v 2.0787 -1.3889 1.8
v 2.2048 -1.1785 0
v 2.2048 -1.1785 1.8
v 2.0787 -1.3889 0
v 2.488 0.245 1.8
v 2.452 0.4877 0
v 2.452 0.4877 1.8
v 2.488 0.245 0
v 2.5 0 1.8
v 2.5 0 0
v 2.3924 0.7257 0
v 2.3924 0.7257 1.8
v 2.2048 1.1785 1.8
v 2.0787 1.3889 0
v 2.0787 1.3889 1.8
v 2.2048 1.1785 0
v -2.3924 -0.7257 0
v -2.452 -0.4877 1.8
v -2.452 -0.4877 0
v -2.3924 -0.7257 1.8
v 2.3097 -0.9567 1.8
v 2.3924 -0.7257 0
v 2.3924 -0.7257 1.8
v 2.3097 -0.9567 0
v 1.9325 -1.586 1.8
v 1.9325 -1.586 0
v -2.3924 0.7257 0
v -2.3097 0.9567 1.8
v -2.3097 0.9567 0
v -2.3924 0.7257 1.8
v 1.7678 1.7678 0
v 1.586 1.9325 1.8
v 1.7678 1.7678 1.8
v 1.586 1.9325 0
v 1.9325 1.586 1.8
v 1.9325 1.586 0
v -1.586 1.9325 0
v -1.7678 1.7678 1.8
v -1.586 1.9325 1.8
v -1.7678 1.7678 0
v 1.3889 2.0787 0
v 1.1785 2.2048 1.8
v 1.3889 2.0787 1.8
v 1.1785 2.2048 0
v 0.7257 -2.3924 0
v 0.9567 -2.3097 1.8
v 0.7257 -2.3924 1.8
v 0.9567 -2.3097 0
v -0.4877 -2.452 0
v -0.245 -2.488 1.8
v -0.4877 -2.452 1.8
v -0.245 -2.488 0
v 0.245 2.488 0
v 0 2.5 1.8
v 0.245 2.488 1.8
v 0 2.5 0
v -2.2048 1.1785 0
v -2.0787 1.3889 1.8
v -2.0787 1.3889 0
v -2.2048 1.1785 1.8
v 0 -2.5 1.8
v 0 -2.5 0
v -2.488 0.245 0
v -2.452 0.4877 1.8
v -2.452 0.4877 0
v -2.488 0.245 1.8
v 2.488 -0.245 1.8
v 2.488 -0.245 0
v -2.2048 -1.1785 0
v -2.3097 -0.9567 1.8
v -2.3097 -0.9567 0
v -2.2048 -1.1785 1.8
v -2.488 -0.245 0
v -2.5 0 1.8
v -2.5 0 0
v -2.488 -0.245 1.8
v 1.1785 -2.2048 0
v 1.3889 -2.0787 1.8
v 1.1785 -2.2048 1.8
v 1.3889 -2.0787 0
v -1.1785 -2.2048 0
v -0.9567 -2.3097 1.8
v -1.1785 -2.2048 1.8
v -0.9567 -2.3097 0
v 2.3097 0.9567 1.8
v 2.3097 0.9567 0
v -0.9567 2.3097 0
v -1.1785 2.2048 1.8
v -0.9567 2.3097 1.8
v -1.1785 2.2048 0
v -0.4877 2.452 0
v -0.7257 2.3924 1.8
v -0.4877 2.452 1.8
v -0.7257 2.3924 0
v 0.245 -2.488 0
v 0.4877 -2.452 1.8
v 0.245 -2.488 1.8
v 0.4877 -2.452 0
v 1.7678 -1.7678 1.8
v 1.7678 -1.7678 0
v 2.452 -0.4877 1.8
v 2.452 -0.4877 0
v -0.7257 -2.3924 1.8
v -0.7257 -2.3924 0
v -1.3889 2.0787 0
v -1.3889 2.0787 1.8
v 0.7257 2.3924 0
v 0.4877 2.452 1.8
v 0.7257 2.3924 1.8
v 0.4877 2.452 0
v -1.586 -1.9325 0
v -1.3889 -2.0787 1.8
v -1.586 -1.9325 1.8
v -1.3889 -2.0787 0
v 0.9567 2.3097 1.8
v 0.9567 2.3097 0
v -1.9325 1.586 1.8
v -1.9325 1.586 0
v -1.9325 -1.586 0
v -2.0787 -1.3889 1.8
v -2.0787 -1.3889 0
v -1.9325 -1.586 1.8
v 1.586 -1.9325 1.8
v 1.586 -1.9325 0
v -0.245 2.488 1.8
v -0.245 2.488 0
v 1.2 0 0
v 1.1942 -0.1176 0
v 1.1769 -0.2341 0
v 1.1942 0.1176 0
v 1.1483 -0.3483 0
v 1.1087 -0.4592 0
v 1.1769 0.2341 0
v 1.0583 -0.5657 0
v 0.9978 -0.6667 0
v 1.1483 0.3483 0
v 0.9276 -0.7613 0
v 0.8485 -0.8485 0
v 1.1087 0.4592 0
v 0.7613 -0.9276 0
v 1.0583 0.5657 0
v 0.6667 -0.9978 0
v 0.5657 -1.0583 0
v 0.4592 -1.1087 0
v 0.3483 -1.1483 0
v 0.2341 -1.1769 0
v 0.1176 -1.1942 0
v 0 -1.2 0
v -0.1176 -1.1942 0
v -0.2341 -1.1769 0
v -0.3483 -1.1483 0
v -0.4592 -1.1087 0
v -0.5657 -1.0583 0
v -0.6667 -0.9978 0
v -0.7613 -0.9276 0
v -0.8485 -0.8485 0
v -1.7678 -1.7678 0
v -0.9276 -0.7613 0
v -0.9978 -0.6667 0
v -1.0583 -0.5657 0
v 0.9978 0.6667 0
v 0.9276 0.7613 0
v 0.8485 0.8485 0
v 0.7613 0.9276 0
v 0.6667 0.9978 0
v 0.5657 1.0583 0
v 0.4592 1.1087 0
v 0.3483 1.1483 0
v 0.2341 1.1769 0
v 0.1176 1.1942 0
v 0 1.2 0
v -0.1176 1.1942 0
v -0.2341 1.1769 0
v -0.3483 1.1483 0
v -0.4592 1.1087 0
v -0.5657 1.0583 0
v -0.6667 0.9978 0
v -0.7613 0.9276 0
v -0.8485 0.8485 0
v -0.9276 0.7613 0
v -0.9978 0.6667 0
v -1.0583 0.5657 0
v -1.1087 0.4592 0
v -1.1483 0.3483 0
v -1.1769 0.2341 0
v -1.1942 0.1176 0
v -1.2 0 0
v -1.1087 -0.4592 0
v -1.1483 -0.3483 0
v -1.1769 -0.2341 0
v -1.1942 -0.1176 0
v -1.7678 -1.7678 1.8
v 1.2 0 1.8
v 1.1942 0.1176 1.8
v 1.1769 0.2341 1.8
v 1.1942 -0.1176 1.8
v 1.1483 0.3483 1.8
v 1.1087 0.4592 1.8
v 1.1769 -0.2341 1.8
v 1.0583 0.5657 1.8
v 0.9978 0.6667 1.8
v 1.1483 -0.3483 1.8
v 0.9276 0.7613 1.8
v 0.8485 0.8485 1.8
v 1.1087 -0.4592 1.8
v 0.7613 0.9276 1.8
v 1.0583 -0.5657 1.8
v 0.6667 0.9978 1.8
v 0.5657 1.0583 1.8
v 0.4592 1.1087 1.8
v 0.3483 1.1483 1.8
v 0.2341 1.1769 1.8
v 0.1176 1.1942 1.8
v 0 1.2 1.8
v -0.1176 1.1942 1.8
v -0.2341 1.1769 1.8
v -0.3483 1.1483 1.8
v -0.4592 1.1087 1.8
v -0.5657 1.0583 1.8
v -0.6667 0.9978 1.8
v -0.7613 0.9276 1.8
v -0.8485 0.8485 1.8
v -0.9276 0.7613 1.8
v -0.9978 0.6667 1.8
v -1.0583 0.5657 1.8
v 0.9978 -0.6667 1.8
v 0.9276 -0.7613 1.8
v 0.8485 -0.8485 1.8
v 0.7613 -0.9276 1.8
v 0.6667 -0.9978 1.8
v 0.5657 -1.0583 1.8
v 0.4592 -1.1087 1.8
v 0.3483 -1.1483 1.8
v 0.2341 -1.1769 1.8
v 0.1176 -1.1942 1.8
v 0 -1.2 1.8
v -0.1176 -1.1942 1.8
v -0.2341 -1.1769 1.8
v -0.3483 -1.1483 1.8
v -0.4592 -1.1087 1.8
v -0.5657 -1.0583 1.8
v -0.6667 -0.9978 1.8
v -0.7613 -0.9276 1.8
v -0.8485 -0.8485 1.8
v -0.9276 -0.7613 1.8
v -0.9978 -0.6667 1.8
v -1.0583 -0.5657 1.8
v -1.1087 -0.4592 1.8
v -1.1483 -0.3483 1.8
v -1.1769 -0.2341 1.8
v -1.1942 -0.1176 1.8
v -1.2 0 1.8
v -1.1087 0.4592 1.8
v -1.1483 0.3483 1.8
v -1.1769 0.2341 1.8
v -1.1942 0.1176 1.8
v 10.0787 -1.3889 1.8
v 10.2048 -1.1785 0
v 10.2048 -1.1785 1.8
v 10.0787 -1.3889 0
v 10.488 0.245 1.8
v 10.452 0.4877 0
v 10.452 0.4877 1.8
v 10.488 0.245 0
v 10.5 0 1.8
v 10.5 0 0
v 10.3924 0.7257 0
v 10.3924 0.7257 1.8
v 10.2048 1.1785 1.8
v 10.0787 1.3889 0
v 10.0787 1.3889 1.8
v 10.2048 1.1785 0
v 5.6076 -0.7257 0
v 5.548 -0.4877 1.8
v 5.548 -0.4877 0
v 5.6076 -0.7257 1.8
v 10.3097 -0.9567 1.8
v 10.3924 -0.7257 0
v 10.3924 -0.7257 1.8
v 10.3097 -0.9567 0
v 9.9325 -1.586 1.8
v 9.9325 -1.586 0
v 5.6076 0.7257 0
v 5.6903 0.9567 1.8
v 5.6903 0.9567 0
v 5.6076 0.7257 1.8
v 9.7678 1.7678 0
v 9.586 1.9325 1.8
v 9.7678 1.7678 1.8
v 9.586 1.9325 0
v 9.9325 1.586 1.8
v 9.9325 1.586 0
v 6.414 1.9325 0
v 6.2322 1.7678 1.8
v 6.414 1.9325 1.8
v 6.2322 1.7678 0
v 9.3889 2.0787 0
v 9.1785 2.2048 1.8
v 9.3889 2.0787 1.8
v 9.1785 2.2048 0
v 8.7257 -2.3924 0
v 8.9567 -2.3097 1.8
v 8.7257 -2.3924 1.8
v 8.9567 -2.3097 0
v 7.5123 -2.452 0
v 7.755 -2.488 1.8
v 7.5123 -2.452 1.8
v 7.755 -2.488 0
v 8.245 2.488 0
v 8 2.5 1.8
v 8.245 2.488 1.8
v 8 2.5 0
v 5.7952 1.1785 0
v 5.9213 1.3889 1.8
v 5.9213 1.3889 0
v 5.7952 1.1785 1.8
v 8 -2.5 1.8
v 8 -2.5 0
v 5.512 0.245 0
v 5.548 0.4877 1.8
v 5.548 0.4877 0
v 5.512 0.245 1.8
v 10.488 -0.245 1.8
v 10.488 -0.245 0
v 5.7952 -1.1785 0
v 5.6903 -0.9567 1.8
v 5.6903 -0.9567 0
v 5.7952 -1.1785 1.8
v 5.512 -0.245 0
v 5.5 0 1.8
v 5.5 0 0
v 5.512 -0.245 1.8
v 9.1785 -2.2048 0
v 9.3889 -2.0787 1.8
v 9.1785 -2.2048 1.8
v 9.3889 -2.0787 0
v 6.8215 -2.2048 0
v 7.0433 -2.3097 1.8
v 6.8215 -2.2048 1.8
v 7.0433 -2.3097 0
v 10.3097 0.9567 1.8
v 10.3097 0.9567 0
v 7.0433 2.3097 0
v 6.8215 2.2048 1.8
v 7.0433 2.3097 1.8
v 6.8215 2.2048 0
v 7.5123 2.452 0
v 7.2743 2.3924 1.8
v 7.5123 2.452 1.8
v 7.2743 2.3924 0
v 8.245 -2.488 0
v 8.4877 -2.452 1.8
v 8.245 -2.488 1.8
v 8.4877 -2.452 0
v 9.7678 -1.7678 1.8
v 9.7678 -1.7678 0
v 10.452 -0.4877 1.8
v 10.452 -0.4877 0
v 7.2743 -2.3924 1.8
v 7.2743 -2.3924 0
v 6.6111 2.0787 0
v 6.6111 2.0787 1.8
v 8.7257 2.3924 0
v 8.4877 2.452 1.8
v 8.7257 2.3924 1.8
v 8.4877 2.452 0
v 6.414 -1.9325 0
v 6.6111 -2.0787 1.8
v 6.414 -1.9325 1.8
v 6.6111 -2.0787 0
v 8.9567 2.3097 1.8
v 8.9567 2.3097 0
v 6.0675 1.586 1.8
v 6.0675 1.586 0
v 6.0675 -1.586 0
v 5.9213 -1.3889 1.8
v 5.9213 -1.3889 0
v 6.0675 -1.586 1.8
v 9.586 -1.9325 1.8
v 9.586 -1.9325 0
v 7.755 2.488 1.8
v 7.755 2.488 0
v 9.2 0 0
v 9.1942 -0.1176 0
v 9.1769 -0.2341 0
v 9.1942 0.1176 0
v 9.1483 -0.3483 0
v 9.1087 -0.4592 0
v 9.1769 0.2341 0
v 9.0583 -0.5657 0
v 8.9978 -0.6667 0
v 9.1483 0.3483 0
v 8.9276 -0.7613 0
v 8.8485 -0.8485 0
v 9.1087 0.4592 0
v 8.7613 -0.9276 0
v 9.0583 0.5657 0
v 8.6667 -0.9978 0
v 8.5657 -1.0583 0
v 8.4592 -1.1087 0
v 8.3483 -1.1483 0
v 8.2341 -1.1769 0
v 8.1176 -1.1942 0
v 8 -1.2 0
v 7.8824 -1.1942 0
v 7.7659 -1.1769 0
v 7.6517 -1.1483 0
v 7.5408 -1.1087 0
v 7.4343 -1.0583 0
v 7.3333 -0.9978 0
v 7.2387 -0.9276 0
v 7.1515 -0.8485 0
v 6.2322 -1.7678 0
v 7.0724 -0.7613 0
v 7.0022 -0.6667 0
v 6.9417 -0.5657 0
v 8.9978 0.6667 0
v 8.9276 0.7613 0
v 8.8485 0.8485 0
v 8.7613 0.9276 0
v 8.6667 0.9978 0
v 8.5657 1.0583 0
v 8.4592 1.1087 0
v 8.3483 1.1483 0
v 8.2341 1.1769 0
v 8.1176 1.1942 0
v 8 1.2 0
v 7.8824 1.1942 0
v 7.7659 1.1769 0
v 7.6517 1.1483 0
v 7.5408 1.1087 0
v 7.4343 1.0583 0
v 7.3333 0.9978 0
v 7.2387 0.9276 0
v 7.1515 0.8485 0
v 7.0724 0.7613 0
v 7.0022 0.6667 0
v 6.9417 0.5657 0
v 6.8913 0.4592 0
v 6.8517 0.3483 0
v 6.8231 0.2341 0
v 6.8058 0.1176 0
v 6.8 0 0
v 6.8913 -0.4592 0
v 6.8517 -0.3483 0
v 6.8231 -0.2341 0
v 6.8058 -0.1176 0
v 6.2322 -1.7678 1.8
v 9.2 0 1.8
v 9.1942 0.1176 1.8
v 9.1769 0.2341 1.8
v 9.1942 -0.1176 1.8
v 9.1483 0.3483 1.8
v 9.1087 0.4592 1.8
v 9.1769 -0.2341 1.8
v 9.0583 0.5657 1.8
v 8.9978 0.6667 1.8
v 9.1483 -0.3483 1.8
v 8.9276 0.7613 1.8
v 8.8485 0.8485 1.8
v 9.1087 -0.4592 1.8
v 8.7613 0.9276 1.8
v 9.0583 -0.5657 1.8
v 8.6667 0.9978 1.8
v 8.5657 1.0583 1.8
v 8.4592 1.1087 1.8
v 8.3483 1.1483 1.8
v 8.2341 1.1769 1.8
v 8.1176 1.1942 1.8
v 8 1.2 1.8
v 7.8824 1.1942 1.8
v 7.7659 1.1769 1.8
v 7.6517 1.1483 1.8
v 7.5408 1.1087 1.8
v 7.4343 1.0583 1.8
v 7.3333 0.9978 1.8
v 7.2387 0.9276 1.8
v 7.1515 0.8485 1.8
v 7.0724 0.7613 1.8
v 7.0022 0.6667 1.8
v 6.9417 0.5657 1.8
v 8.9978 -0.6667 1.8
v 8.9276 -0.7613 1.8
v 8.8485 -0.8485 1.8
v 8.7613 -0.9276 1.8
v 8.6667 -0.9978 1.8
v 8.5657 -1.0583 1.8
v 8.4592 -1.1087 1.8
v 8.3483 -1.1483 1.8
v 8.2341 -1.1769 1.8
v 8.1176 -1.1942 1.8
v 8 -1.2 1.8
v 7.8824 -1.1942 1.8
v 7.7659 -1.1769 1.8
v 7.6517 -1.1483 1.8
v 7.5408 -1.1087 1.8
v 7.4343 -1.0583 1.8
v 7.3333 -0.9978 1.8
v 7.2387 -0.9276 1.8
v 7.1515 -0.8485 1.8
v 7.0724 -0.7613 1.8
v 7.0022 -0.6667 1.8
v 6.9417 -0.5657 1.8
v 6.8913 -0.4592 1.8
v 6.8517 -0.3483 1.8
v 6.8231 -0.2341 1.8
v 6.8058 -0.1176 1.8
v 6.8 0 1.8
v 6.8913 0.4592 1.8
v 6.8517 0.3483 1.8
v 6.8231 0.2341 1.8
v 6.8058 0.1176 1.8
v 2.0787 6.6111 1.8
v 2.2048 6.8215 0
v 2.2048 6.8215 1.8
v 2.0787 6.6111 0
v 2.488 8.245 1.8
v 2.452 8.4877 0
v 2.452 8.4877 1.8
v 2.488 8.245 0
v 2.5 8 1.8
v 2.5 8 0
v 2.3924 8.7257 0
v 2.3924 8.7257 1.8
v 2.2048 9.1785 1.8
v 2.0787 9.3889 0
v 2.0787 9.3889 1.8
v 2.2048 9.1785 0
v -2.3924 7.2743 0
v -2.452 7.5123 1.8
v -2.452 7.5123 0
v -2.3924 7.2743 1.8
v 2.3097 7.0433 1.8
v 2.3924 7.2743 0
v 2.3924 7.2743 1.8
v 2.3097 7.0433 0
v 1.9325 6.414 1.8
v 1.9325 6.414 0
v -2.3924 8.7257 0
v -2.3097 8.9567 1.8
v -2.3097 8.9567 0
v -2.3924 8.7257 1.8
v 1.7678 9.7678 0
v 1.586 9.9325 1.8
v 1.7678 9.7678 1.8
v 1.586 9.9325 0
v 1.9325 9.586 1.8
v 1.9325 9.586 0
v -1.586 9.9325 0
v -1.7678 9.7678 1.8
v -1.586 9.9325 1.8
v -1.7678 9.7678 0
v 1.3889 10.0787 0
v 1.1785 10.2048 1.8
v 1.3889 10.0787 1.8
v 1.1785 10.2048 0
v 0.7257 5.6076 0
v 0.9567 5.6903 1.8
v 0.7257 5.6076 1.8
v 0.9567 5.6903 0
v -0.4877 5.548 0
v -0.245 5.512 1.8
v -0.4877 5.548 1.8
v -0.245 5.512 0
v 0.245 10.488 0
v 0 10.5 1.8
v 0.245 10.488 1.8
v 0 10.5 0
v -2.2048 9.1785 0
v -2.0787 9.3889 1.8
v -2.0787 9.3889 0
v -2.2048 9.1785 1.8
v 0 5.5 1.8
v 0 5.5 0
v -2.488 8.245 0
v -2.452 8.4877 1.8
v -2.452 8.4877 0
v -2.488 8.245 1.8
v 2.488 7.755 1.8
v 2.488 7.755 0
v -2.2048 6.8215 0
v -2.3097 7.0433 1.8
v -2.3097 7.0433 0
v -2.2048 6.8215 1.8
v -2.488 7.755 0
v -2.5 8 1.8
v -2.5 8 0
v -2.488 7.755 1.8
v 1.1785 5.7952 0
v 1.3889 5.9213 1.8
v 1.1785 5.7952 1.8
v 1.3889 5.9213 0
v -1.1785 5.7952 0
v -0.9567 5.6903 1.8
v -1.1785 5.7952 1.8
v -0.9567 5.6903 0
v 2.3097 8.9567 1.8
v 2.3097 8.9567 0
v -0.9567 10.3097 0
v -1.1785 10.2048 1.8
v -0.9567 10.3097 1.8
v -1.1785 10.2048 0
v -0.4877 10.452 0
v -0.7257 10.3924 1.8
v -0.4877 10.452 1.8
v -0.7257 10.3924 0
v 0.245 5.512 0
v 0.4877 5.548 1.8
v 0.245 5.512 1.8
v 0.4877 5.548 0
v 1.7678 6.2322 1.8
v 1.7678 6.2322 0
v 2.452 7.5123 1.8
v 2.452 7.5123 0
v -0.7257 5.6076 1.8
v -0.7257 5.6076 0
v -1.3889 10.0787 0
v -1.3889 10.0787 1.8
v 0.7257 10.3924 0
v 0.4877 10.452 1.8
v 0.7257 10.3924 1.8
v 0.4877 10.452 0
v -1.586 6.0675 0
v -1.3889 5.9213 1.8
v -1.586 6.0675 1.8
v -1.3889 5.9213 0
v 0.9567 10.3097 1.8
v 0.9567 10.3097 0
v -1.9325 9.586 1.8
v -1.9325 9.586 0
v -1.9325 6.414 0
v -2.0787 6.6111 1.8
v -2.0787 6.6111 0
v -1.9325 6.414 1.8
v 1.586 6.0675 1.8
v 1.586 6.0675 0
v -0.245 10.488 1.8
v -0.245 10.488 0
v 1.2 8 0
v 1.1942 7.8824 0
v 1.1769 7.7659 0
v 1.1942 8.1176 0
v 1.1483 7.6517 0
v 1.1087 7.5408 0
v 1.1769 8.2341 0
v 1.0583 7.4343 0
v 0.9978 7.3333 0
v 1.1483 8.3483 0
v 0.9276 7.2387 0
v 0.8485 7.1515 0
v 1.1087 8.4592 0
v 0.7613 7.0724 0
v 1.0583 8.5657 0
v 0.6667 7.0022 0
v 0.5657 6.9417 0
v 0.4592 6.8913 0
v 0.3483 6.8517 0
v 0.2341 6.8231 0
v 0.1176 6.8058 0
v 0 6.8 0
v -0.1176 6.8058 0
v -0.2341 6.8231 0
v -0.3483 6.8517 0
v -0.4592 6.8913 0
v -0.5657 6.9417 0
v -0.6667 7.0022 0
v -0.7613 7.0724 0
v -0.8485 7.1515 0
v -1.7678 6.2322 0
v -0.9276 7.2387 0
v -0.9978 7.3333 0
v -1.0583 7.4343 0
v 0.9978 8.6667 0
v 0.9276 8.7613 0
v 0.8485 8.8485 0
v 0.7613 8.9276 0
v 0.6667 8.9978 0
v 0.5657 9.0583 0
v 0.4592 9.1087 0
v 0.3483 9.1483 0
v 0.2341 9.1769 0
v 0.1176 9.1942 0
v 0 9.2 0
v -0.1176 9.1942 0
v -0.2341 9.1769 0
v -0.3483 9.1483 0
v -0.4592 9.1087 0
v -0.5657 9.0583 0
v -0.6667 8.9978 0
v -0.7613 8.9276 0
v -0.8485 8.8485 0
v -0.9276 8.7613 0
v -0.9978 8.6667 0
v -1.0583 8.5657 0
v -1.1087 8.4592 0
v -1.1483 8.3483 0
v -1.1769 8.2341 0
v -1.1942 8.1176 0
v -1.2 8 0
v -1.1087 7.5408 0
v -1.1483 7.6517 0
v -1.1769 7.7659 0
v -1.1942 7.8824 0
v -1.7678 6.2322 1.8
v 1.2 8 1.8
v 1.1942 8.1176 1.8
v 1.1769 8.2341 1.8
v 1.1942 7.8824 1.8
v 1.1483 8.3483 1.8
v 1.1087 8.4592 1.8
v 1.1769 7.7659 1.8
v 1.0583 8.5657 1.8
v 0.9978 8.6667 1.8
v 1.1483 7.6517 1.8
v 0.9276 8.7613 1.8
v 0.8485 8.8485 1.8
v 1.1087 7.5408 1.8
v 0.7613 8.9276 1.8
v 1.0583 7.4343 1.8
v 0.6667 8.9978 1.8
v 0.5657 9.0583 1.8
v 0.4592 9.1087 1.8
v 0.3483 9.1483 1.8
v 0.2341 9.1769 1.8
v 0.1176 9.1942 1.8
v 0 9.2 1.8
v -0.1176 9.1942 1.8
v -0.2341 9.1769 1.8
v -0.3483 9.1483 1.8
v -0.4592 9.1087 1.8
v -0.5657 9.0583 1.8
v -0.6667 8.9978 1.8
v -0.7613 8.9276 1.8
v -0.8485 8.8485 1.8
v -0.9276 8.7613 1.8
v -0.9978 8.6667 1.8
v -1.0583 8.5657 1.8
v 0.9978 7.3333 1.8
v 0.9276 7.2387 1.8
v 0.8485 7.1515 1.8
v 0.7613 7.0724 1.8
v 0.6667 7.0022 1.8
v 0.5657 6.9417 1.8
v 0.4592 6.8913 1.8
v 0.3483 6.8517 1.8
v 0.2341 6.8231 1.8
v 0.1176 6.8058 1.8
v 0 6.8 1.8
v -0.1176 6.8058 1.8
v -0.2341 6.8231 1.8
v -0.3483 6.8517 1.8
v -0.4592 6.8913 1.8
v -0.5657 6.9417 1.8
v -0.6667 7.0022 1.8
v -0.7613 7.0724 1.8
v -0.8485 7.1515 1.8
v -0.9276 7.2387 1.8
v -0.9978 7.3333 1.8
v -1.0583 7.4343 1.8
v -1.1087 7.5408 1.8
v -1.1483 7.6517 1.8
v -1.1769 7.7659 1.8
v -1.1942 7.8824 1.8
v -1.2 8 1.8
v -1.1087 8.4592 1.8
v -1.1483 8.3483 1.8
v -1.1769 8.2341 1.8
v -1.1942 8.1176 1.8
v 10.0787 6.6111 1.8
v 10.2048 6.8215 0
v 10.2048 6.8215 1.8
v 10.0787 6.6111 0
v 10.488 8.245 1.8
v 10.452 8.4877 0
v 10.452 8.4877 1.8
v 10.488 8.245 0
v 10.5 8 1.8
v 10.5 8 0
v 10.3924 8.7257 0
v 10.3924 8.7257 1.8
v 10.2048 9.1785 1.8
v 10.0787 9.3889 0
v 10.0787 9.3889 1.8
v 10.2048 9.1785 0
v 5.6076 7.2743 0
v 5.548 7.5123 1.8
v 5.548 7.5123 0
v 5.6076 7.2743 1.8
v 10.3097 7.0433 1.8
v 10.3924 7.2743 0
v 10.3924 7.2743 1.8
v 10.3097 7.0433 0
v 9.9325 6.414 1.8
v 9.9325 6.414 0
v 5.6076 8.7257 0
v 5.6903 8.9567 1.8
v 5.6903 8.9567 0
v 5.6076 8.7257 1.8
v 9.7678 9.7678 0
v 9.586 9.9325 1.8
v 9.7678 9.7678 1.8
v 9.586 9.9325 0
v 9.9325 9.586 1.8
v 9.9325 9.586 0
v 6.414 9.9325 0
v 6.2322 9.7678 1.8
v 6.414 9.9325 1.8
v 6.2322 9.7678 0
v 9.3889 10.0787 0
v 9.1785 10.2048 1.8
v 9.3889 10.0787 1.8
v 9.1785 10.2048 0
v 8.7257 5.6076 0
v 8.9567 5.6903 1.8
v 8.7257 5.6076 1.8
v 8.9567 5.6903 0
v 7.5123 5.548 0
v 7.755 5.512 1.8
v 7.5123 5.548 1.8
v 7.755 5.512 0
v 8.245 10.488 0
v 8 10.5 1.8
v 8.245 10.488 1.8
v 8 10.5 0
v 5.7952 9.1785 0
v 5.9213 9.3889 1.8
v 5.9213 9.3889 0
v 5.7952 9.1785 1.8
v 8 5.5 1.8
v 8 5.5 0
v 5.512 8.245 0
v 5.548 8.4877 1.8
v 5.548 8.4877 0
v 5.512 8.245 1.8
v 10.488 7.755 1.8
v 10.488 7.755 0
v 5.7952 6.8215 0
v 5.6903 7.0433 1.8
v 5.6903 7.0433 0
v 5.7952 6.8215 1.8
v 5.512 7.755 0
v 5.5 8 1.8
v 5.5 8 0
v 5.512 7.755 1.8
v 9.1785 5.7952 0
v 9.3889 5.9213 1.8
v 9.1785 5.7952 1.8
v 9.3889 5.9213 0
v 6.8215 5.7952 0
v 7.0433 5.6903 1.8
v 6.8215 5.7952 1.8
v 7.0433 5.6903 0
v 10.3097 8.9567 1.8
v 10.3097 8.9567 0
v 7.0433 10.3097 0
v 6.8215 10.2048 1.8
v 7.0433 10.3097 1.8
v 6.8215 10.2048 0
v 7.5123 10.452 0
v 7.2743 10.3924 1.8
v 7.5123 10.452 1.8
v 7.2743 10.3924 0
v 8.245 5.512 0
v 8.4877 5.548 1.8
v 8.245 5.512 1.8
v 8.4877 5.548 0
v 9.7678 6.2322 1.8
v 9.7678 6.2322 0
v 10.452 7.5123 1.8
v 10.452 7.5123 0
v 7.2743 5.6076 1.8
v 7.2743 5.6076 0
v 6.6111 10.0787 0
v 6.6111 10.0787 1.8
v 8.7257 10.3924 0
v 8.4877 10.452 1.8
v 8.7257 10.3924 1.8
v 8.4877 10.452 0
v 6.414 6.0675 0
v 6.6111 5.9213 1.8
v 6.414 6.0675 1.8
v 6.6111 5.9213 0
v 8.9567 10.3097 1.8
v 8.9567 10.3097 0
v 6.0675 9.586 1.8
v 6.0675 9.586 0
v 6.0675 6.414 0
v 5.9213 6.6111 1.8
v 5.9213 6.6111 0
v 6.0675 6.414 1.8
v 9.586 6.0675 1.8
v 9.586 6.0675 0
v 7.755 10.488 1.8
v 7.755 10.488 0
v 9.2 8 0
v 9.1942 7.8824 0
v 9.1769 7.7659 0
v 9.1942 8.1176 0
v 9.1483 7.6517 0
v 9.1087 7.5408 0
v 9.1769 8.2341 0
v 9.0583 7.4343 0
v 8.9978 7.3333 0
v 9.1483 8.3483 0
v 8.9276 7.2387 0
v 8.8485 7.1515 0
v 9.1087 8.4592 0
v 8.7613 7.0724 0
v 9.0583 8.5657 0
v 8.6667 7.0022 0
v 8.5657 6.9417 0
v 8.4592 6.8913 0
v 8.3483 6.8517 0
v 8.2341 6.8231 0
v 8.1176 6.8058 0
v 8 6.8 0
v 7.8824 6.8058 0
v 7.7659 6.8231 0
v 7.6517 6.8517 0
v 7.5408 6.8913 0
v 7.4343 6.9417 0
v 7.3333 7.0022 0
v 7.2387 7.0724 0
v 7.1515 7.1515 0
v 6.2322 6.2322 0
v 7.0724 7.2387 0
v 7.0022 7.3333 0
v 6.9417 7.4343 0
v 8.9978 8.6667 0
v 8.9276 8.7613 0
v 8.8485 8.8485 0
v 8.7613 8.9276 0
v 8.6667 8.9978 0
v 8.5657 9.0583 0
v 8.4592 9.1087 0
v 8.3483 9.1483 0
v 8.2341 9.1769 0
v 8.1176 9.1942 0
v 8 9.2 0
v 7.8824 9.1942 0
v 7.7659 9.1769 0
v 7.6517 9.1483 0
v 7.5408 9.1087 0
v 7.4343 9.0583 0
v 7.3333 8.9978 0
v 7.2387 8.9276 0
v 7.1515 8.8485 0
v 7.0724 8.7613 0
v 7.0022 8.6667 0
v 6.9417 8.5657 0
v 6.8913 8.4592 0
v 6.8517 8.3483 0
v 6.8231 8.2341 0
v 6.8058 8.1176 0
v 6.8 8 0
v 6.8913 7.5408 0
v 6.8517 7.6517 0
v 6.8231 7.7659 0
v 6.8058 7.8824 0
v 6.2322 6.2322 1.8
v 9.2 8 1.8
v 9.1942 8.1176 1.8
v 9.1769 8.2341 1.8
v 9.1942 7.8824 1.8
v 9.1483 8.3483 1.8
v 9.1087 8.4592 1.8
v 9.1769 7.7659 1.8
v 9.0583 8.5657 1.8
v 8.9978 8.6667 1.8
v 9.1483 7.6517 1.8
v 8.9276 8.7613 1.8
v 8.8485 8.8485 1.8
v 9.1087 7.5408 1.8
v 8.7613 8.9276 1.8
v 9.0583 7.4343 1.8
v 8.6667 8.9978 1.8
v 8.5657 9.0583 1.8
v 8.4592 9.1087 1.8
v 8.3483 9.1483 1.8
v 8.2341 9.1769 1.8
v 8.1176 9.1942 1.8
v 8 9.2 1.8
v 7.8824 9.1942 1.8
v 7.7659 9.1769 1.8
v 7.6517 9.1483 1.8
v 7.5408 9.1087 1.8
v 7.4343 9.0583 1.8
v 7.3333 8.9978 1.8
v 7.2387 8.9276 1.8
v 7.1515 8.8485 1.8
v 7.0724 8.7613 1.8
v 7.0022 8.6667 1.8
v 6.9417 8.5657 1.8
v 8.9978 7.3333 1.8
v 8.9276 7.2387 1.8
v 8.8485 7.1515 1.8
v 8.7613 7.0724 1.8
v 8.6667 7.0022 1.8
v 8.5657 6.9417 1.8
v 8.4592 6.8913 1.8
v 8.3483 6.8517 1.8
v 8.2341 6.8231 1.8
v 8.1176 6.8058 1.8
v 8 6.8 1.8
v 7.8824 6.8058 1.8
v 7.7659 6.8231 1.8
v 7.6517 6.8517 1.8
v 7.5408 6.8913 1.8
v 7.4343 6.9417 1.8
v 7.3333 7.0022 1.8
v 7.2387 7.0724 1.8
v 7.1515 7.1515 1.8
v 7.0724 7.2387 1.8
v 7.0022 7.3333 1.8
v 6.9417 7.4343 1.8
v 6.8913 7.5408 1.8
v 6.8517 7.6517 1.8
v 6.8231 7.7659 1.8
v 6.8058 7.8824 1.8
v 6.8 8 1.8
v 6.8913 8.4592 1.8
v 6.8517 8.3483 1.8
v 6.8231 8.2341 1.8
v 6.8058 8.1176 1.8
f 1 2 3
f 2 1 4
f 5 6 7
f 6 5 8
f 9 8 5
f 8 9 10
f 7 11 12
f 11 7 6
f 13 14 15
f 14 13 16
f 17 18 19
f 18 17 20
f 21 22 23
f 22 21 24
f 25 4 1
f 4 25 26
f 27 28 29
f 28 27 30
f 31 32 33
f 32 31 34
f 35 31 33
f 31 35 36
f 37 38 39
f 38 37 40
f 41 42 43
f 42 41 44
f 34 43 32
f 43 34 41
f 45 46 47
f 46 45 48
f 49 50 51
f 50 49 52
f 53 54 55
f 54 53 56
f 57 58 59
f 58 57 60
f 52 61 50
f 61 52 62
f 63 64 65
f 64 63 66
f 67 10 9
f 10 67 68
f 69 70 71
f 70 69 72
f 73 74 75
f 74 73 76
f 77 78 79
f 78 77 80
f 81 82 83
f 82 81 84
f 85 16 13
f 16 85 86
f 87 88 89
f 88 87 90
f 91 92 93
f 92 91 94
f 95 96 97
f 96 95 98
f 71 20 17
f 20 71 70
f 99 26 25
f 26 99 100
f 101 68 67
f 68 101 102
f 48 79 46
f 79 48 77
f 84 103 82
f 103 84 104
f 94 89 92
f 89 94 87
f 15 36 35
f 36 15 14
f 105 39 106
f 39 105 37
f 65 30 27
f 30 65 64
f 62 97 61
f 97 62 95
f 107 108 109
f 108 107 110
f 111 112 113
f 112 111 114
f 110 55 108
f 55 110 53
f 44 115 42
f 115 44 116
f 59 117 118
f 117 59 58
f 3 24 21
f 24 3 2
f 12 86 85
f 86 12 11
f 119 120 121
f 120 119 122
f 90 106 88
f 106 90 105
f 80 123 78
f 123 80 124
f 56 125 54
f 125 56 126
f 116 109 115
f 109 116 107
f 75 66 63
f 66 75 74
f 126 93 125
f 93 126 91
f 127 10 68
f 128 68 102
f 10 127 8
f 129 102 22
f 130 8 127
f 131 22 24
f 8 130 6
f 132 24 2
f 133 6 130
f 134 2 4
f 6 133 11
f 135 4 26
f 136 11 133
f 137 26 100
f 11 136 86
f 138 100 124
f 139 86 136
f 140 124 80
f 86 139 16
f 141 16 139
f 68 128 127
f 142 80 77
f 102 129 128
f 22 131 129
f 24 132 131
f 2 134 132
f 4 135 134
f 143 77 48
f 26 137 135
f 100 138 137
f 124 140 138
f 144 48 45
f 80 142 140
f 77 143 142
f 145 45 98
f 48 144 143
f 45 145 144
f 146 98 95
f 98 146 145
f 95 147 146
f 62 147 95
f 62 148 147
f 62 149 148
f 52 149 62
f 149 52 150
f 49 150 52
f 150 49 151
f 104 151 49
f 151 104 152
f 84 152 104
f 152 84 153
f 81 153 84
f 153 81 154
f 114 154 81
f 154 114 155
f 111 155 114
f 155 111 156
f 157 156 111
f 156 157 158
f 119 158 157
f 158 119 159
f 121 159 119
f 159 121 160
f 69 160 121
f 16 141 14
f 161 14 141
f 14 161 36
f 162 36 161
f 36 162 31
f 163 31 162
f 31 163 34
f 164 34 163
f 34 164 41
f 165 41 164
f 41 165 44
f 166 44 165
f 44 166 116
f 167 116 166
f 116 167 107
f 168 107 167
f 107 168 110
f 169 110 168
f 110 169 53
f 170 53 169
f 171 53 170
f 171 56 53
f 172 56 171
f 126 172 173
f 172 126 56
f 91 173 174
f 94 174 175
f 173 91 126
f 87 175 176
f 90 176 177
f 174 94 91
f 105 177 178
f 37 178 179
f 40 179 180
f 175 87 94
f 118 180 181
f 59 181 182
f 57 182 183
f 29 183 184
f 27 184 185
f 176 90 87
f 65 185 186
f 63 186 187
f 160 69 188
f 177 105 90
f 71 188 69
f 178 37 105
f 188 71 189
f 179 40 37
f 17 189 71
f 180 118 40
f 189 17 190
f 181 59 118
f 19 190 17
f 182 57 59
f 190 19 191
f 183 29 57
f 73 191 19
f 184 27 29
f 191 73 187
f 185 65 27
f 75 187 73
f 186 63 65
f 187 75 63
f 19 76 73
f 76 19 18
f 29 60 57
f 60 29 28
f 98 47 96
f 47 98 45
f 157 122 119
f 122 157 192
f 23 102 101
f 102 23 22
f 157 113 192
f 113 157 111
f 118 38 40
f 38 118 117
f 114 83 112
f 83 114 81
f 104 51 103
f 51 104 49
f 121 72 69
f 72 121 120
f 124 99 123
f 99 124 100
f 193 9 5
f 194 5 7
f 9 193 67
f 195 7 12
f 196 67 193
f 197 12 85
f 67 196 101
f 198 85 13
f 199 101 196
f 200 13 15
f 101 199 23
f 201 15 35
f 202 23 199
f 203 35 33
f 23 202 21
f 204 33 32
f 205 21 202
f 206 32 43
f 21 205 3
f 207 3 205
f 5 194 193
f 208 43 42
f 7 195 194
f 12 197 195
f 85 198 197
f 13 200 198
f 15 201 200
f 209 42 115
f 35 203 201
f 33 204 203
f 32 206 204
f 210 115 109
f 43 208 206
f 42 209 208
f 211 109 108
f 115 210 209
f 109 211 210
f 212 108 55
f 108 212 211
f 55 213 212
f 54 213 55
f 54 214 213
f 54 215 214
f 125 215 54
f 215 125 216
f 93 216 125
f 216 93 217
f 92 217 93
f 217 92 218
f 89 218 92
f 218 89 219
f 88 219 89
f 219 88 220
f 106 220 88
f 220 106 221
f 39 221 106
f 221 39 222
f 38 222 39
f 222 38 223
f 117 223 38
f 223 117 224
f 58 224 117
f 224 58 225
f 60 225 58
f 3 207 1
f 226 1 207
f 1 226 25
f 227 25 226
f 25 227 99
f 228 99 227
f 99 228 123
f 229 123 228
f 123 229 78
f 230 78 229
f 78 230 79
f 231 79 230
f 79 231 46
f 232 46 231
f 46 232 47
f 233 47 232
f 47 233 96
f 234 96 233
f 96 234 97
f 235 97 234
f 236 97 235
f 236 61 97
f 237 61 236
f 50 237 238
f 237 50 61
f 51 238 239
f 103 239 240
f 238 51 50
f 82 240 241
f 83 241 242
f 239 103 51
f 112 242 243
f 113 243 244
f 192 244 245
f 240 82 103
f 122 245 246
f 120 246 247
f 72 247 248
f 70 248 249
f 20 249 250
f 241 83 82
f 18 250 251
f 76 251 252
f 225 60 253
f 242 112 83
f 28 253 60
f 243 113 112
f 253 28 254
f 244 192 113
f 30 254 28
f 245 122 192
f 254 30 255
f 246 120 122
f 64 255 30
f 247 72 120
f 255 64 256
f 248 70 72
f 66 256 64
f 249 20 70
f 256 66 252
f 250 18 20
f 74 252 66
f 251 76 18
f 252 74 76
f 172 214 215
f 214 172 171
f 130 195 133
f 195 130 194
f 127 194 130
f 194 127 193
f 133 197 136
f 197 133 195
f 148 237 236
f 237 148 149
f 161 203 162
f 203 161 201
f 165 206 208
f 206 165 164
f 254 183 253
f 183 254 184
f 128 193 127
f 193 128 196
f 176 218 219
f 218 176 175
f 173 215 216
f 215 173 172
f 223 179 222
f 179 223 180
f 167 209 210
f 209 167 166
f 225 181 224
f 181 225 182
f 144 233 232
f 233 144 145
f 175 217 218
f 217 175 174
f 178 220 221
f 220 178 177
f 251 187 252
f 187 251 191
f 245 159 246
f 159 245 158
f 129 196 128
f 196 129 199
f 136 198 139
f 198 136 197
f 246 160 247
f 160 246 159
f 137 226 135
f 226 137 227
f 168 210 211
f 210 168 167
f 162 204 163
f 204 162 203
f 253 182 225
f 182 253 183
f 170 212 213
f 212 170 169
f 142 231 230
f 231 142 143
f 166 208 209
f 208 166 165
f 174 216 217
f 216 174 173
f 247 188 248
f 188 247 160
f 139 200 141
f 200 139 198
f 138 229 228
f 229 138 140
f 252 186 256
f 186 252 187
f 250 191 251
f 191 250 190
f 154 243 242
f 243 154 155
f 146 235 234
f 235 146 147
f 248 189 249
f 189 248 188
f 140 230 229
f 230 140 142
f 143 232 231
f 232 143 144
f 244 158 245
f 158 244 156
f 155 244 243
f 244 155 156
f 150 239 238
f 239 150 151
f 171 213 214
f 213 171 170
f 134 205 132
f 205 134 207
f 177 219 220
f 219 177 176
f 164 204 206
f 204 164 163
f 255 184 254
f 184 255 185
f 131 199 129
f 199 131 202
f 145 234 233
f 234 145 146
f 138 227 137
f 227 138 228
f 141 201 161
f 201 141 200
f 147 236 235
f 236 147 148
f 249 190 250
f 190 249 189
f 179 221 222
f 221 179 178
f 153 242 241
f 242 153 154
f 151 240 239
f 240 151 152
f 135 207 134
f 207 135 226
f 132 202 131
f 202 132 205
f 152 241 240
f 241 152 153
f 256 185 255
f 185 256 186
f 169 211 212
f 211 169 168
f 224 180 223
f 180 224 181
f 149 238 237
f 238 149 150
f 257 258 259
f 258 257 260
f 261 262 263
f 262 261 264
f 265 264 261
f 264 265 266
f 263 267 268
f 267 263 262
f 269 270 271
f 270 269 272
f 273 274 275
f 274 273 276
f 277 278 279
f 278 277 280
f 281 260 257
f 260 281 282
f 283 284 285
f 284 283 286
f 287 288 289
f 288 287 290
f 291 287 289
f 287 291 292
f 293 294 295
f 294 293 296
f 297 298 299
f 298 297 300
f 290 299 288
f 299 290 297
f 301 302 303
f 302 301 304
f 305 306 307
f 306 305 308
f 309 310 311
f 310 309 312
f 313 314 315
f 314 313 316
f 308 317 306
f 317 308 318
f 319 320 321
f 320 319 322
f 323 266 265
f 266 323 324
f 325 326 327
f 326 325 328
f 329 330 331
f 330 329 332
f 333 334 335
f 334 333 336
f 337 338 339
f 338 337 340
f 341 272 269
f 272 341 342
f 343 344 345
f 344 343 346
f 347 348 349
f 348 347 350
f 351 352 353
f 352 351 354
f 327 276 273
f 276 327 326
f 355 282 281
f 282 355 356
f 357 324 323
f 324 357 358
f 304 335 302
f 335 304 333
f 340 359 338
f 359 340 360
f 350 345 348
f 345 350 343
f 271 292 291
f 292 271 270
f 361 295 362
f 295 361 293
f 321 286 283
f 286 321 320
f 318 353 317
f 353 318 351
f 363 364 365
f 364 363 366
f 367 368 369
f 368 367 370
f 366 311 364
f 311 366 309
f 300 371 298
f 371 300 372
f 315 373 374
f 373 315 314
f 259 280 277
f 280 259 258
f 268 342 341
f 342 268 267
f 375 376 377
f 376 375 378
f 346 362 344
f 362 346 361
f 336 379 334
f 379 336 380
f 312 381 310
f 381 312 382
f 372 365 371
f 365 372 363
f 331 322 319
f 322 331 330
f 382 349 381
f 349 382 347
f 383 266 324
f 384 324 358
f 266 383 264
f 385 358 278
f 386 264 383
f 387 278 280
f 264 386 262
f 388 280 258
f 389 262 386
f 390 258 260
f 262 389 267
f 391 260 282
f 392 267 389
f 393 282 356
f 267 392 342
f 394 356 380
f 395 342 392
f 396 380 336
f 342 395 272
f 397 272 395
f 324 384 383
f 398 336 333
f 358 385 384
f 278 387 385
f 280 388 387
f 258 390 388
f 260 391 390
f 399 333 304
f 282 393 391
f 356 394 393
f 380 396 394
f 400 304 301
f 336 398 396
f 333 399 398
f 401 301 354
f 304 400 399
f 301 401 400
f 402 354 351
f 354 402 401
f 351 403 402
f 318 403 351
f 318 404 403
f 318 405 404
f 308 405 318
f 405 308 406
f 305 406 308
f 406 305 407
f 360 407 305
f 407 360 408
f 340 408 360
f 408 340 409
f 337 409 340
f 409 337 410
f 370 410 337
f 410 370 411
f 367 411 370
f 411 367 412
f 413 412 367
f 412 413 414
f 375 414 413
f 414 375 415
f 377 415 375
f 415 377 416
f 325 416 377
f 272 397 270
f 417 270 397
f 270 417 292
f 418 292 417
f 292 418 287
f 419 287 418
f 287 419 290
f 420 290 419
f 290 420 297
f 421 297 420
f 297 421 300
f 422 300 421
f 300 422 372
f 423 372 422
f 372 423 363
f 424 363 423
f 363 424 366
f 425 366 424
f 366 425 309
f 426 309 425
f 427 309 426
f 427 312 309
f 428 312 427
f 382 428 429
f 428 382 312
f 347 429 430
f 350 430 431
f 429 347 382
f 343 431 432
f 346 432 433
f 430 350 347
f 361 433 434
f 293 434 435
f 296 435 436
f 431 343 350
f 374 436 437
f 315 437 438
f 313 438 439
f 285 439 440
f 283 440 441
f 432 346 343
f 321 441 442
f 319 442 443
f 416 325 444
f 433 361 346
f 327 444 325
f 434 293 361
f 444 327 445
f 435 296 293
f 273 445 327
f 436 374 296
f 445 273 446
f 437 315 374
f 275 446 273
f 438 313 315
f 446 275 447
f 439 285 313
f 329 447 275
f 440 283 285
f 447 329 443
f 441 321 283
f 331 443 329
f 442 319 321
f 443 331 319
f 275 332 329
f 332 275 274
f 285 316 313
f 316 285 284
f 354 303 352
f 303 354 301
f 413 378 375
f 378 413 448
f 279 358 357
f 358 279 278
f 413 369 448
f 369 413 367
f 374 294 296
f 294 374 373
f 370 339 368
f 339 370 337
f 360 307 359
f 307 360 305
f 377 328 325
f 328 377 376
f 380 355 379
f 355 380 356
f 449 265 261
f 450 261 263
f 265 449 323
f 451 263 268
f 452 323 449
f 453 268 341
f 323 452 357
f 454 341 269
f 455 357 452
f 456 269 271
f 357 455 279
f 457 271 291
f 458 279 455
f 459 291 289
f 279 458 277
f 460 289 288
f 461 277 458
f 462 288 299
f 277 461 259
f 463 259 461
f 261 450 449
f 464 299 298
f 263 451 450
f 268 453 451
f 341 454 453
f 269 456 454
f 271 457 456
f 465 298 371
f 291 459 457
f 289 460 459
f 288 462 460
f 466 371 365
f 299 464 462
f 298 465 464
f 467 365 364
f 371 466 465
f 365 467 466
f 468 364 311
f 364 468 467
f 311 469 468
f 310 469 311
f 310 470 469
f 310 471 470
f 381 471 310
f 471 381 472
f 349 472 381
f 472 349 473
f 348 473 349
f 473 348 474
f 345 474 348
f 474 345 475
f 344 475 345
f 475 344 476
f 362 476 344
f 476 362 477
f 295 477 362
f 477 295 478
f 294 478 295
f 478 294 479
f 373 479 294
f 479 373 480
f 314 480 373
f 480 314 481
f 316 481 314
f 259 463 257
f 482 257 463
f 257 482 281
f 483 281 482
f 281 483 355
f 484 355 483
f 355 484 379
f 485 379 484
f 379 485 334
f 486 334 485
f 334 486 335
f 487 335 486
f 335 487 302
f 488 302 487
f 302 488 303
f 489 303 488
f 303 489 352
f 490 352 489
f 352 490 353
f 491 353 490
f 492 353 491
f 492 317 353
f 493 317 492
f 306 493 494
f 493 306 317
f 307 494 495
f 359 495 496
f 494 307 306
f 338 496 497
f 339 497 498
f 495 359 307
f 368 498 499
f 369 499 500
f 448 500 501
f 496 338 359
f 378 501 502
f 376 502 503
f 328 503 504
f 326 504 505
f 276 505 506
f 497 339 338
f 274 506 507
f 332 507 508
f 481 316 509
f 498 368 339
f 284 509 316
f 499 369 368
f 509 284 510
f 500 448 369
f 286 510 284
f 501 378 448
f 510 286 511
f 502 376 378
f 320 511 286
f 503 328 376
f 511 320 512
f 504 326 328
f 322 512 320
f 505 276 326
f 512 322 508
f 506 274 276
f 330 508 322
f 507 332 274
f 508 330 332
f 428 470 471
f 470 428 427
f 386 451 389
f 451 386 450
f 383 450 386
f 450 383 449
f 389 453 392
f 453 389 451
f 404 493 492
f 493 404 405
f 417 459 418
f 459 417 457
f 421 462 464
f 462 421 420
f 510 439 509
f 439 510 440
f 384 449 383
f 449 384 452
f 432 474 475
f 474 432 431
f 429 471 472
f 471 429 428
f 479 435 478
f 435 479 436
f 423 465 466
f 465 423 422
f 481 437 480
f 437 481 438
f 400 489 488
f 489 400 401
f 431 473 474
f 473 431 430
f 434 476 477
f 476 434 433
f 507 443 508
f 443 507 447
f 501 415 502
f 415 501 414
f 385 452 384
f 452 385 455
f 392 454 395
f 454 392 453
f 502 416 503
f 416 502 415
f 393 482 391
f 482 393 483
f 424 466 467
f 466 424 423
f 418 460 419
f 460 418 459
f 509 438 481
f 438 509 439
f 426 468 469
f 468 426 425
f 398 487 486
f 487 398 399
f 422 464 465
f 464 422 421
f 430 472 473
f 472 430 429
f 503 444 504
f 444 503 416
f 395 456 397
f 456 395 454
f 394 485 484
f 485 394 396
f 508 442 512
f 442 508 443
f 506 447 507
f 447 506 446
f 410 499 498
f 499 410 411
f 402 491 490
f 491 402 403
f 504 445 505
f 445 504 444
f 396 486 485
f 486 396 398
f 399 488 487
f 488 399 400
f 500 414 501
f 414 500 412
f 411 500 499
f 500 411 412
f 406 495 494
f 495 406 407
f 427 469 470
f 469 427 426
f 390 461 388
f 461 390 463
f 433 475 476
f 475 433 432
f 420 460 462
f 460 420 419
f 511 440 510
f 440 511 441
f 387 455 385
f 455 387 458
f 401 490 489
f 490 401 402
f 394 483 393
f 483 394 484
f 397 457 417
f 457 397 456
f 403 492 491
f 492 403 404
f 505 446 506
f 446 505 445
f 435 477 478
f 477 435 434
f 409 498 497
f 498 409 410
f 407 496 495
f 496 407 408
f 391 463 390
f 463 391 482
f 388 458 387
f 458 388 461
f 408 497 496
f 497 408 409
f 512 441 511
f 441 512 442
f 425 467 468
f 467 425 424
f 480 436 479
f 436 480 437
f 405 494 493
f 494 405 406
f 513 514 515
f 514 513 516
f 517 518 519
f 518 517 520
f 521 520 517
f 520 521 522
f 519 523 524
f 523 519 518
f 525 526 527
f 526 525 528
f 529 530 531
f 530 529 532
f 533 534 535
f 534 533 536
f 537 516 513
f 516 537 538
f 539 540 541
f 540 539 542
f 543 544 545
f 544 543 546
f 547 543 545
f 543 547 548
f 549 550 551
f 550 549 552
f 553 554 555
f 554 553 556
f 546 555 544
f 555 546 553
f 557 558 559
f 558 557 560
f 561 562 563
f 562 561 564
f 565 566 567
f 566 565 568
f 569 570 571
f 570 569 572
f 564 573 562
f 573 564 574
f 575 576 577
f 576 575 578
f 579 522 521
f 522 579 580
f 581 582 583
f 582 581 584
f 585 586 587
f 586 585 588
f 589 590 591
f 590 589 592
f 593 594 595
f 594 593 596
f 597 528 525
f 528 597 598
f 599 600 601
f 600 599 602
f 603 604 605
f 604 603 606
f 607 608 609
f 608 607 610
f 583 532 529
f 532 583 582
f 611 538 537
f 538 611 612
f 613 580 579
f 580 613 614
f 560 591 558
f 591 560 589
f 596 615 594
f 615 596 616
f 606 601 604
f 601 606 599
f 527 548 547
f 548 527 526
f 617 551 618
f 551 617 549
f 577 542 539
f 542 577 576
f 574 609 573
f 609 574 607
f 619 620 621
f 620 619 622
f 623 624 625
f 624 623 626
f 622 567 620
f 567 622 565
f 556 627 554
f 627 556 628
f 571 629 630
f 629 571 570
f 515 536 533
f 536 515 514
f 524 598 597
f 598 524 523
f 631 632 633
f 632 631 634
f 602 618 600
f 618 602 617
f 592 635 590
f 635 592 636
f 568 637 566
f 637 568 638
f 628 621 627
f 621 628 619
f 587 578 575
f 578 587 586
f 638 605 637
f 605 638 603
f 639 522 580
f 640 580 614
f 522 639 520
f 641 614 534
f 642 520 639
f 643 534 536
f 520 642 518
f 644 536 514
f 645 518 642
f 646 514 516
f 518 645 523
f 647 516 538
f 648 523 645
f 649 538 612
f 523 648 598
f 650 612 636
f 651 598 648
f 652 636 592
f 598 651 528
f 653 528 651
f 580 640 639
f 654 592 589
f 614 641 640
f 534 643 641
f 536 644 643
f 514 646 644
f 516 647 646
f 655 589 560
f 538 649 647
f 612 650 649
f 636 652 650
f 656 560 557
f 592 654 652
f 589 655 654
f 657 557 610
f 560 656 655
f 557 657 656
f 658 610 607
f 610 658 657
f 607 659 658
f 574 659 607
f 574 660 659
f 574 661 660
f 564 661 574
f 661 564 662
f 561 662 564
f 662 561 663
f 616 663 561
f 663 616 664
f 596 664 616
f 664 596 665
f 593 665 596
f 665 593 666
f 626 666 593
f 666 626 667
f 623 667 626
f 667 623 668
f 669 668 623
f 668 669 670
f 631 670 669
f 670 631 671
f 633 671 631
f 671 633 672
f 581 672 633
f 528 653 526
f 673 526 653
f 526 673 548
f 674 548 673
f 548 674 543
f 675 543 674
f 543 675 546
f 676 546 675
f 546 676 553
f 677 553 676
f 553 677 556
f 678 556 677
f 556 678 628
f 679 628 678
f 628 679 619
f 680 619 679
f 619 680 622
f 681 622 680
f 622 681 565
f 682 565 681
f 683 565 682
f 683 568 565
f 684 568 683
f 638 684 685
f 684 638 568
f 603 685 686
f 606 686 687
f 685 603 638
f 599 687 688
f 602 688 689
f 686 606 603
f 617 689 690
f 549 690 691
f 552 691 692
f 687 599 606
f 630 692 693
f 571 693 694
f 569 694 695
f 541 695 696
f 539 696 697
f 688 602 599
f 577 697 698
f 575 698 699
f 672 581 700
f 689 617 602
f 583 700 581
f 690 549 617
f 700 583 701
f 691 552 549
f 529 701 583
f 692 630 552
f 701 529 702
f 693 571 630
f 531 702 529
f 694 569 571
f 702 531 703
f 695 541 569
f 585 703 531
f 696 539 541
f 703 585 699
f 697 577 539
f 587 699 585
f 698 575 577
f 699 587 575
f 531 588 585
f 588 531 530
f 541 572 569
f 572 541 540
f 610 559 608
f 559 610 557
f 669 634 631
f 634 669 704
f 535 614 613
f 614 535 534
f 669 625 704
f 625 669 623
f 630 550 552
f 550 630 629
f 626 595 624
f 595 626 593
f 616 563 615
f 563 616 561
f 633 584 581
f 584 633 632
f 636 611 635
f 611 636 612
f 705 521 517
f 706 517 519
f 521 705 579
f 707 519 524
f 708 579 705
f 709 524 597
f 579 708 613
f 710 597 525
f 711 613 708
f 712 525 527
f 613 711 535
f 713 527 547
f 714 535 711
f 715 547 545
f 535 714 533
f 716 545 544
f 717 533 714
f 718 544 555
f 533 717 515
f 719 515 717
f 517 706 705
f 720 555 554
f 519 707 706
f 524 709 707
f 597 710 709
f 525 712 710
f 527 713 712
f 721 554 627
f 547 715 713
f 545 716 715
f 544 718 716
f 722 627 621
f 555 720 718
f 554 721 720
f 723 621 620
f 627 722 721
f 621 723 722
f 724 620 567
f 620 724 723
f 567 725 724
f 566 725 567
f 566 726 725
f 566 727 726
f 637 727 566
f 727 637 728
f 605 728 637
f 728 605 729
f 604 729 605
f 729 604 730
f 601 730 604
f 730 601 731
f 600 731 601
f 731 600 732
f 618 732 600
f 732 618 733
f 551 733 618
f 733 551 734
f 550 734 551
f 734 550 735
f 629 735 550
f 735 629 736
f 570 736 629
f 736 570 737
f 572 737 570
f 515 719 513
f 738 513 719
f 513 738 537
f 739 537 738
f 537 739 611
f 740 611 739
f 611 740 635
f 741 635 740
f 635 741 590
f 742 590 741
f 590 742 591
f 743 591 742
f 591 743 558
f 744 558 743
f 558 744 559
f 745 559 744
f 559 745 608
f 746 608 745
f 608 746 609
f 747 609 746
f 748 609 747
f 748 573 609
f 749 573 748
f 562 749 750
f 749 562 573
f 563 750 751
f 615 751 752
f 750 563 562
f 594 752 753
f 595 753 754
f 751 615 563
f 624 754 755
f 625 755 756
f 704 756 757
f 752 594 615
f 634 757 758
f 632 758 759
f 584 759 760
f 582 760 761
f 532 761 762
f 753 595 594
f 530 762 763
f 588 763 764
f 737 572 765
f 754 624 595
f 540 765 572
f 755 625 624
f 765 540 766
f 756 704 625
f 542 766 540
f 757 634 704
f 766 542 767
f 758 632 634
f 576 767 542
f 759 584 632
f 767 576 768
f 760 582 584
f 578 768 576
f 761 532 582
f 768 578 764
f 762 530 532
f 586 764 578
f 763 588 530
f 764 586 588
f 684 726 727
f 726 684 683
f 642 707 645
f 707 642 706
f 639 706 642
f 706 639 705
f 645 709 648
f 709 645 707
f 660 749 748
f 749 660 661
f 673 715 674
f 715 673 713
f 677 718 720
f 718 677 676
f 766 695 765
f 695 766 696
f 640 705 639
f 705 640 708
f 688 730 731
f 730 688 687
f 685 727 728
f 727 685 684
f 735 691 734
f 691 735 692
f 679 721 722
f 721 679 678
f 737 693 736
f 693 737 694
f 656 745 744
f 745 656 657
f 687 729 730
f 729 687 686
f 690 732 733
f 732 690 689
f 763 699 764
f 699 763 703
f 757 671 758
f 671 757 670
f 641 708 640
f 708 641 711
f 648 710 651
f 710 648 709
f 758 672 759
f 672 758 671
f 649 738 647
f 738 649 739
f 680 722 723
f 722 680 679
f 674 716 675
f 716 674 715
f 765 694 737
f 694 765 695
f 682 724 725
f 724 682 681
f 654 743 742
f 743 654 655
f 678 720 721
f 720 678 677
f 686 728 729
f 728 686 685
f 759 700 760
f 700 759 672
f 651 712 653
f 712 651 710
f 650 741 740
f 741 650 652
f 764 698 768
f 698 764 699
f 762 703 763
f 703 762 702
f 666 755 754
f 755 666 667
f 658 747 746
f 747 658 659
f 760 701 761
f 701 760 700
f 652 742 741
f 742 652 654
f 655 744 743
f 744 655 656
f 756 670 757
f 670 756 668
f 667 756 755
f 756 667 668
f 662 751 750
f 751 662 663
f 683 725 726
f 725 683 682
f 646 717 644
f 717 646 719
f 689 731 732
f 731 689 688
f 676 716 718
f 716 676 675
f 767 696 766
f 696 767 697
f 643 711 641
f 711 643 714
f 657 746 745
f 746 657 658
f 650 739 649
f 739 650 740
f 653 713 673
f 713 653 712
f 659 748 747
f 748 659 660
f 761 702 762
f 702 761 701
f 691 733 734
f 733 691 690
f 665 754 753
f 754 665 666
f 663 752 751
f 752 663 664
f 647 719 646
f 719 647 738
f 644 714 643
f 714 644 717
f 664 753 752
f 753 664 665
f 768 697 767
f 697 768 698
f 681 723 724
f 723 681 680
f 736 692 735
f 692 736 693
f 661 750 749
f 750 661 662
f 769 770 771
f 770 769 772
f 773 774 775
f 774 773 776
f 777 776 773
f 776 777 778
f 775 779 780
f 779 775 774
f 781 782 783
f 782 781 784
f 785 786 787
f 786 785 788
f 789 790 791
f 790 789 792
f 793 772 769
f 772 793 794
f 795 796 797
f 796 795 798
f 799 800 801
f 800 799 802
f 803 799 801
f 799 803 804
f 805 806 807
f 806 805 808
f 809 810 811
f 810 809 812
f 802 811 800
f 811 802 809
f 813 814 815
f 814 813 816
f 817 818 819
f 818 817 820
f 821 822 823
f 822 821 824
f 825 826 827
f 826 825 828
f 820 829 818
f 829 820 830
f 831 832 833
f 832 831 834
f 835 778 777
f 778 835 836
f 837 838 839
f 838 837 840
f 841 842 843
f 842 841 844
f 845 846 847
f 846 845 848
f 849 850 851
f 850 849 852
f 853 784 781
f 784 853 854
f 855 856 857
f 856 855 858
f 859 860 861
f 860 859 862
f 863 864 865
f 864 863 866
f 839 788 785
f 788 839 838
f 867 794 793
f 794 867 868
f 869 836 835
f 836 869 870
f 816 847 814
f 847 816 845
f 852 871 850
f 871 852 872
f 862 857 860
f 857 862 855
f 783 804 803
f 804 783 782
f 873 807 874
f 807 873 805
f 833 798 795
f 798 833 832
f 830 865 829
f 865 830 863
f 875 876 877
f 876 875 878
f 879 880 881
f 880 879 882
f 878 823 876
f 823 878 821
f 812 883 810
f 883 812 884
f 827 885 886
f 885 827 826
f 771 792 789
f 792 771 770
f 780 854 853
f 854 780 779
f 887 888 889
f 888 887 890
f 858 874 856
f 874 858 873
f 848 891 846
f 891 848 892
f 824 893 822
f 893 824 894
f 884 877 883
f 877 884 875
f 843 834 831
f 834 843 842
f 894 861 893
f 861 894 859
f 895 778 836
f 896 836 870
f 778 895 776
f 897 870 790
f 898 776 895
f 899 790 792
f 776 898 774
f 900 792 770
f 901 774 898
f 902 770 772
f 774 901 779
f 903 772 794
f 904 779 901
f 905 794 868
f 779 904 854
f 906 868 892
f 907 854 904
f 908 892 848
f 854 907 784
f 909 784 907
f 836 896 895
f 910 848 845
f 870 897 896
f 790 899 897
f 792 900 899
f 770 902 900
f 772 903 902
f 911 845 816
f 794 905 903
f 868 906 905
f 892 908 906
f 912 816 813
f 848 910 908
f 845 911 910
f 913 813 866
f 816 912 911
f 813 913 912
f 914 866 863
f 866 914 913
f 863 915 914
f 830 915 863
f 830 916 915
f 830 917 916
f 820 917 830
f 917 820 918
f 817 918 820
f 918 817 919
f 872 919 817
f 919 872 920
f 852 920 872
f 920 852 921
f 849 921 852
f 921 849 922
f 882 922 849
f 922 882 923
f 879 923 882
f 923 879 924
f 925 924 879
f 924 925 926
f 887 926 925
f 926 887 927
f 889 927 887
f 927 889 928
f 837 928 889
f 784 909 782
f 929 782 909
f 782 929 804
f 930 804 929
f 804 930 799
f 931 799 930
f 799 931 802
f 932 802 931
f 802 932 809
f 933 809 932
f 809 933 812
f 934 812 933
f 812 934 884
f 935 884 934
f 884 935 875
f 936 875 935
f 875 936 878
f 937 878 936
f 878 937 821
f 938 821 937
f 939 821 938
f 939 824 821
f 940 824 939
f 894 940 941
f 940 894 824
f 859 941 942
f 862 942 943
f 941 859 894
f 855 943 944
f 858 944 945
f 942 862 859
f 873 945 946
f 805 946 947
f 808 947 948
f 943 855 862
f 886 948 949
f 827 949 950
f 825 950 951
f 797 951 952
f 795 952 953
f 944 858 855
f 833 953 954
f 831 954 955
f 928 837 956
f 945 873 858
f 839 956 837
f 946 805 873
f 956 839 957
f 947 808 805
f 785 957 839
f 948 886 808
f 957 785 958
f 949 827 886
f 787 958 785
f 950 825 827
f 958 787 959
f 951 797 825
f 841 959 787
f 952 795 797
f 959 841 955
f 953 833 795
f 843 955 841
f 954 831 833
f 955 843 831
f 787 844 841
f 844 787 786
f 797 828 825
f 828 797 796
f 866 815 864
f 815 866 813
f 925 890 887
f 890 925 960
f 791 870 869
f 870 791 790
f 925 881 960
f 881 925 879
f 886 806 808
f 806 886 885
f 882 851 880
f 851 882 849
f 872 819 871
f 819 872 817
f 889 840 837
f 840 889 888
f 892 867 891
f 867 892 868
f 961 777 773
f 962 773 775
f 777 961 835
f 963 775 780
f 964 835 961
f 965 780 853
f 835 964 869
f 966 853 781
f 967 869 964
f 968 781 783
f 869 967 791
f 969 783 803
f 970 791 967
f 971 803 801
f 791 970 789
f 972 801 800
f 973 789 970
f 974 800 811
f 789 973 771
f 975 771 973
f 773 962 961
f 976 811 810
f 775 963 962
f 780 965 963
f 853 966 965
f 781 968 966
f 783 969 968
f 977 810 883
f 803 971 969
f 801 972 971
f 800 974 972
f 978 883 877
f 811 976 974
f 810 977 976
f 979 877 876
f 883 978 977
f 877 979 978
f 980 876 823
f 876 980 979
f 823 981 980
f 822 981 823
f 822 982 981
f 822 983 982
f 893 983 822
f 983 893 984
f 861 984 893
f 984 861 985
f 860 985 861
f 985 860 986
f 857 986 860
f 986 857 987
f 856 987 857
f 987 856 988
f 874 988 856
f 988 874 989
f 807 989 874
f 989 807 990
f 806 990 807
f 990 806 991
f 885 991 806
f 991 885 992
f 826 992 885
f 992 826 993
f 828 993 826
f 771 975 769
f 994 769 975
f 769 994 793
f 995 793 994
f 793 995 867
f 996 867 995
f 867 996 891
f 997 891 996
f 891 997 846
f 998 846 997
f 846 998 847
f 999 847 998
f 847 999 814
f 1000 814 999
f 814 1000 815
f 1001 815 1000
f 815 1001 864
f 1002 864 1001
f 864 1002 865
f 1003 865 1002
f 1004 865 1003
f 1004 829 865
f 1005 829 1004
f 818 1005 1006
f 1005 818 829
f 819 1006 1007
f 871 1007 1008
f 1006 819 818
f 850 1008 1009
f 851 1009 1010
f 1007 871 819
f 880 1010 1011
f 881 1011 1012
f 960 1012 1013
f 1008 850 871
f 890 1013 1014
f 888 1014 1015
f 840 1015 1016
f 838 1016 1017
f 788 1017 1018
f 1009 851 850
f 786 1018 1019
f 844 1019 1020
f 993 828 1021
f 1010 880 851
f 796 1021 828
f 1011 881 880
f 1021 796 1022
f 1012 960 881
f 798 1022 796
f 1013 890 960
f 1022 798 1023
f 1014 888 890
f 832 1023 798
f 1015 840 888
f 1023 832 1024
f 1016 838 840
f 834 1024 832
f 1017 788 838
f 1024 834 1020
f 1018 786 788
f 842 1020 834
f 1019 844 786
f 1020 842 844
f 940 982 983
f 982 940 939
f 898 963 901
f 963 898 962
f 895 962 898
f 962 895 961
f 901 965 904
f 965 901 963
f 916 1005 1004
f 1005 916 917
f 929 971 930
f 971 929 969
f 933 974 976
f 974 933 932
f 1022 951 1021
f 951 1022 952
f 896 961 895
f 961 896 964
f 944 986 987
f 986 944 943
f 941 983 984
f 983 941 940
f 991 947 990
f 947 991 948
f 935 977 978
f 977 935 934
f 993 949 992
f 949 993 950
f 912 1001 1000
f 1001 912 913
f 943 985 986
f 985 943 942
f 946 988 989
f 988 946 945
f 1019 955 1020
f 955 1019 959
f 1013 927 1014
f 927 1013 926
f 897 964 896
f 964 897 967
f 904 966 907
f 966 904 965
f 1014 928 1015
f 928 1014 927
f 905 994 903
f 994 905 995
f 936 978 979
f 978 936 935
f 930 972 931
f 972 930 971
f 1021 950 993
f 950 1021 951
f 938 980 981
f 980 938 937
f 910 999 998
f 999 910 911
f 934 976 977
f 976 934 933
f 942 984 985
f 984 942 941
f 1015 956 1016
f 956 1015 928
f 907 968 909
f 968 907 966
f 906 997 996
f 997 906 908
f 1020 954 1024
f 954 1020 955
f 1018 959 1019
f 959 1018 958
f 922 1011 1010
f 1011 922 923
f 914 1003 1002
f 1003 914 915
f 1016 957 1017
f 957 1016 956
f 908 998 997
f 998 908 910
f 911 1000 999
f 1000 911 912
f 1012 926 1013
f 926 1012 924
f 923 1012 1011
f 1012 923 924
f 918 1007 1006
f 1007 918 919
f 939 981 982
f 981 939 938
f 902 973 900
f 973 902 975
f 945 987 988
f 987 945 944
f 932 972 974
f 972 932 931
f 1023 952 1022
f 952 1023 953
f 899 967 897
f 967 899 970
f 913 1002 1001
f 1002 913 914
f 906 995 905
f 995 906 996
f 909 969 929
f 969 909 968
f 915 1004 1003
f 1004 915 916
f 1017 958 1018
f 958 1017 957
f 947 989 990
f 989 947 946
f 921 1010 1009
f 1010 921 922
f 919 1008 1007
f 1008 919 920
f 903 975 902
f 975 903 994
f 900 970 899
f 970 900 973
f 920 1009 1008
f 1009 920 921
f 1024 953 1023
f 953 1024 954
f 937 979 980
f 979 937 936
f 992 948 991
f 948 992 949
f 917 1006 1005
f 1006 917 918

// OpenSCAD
// Washers for the four M2 (2 mm thread, 6 mm long) screws that hold the OLED board to the head front.
// Stack at each screw: board 1.2 + washer 1.8 + 3.0 mm into the pilot = 6.0 thread, leaving 1 mm of the 4 mm wall.
$fn = 64;
w_id = 2.4;   // screw 2.0 + clearance
w_od = 5.0;   // fits the board's 2.5 mm corner hole margin
w_t  = 1.8;
module washer() difference() {
    cylinder(d = w_od, h = w_t);
    translate([0, 0, -1]) cylinder(d = w_id, h = w_t + 2);
}
for (i = [0:3]) translate([(i % 2) * 8, floor(i / 2) * 8, 0]) washer();
